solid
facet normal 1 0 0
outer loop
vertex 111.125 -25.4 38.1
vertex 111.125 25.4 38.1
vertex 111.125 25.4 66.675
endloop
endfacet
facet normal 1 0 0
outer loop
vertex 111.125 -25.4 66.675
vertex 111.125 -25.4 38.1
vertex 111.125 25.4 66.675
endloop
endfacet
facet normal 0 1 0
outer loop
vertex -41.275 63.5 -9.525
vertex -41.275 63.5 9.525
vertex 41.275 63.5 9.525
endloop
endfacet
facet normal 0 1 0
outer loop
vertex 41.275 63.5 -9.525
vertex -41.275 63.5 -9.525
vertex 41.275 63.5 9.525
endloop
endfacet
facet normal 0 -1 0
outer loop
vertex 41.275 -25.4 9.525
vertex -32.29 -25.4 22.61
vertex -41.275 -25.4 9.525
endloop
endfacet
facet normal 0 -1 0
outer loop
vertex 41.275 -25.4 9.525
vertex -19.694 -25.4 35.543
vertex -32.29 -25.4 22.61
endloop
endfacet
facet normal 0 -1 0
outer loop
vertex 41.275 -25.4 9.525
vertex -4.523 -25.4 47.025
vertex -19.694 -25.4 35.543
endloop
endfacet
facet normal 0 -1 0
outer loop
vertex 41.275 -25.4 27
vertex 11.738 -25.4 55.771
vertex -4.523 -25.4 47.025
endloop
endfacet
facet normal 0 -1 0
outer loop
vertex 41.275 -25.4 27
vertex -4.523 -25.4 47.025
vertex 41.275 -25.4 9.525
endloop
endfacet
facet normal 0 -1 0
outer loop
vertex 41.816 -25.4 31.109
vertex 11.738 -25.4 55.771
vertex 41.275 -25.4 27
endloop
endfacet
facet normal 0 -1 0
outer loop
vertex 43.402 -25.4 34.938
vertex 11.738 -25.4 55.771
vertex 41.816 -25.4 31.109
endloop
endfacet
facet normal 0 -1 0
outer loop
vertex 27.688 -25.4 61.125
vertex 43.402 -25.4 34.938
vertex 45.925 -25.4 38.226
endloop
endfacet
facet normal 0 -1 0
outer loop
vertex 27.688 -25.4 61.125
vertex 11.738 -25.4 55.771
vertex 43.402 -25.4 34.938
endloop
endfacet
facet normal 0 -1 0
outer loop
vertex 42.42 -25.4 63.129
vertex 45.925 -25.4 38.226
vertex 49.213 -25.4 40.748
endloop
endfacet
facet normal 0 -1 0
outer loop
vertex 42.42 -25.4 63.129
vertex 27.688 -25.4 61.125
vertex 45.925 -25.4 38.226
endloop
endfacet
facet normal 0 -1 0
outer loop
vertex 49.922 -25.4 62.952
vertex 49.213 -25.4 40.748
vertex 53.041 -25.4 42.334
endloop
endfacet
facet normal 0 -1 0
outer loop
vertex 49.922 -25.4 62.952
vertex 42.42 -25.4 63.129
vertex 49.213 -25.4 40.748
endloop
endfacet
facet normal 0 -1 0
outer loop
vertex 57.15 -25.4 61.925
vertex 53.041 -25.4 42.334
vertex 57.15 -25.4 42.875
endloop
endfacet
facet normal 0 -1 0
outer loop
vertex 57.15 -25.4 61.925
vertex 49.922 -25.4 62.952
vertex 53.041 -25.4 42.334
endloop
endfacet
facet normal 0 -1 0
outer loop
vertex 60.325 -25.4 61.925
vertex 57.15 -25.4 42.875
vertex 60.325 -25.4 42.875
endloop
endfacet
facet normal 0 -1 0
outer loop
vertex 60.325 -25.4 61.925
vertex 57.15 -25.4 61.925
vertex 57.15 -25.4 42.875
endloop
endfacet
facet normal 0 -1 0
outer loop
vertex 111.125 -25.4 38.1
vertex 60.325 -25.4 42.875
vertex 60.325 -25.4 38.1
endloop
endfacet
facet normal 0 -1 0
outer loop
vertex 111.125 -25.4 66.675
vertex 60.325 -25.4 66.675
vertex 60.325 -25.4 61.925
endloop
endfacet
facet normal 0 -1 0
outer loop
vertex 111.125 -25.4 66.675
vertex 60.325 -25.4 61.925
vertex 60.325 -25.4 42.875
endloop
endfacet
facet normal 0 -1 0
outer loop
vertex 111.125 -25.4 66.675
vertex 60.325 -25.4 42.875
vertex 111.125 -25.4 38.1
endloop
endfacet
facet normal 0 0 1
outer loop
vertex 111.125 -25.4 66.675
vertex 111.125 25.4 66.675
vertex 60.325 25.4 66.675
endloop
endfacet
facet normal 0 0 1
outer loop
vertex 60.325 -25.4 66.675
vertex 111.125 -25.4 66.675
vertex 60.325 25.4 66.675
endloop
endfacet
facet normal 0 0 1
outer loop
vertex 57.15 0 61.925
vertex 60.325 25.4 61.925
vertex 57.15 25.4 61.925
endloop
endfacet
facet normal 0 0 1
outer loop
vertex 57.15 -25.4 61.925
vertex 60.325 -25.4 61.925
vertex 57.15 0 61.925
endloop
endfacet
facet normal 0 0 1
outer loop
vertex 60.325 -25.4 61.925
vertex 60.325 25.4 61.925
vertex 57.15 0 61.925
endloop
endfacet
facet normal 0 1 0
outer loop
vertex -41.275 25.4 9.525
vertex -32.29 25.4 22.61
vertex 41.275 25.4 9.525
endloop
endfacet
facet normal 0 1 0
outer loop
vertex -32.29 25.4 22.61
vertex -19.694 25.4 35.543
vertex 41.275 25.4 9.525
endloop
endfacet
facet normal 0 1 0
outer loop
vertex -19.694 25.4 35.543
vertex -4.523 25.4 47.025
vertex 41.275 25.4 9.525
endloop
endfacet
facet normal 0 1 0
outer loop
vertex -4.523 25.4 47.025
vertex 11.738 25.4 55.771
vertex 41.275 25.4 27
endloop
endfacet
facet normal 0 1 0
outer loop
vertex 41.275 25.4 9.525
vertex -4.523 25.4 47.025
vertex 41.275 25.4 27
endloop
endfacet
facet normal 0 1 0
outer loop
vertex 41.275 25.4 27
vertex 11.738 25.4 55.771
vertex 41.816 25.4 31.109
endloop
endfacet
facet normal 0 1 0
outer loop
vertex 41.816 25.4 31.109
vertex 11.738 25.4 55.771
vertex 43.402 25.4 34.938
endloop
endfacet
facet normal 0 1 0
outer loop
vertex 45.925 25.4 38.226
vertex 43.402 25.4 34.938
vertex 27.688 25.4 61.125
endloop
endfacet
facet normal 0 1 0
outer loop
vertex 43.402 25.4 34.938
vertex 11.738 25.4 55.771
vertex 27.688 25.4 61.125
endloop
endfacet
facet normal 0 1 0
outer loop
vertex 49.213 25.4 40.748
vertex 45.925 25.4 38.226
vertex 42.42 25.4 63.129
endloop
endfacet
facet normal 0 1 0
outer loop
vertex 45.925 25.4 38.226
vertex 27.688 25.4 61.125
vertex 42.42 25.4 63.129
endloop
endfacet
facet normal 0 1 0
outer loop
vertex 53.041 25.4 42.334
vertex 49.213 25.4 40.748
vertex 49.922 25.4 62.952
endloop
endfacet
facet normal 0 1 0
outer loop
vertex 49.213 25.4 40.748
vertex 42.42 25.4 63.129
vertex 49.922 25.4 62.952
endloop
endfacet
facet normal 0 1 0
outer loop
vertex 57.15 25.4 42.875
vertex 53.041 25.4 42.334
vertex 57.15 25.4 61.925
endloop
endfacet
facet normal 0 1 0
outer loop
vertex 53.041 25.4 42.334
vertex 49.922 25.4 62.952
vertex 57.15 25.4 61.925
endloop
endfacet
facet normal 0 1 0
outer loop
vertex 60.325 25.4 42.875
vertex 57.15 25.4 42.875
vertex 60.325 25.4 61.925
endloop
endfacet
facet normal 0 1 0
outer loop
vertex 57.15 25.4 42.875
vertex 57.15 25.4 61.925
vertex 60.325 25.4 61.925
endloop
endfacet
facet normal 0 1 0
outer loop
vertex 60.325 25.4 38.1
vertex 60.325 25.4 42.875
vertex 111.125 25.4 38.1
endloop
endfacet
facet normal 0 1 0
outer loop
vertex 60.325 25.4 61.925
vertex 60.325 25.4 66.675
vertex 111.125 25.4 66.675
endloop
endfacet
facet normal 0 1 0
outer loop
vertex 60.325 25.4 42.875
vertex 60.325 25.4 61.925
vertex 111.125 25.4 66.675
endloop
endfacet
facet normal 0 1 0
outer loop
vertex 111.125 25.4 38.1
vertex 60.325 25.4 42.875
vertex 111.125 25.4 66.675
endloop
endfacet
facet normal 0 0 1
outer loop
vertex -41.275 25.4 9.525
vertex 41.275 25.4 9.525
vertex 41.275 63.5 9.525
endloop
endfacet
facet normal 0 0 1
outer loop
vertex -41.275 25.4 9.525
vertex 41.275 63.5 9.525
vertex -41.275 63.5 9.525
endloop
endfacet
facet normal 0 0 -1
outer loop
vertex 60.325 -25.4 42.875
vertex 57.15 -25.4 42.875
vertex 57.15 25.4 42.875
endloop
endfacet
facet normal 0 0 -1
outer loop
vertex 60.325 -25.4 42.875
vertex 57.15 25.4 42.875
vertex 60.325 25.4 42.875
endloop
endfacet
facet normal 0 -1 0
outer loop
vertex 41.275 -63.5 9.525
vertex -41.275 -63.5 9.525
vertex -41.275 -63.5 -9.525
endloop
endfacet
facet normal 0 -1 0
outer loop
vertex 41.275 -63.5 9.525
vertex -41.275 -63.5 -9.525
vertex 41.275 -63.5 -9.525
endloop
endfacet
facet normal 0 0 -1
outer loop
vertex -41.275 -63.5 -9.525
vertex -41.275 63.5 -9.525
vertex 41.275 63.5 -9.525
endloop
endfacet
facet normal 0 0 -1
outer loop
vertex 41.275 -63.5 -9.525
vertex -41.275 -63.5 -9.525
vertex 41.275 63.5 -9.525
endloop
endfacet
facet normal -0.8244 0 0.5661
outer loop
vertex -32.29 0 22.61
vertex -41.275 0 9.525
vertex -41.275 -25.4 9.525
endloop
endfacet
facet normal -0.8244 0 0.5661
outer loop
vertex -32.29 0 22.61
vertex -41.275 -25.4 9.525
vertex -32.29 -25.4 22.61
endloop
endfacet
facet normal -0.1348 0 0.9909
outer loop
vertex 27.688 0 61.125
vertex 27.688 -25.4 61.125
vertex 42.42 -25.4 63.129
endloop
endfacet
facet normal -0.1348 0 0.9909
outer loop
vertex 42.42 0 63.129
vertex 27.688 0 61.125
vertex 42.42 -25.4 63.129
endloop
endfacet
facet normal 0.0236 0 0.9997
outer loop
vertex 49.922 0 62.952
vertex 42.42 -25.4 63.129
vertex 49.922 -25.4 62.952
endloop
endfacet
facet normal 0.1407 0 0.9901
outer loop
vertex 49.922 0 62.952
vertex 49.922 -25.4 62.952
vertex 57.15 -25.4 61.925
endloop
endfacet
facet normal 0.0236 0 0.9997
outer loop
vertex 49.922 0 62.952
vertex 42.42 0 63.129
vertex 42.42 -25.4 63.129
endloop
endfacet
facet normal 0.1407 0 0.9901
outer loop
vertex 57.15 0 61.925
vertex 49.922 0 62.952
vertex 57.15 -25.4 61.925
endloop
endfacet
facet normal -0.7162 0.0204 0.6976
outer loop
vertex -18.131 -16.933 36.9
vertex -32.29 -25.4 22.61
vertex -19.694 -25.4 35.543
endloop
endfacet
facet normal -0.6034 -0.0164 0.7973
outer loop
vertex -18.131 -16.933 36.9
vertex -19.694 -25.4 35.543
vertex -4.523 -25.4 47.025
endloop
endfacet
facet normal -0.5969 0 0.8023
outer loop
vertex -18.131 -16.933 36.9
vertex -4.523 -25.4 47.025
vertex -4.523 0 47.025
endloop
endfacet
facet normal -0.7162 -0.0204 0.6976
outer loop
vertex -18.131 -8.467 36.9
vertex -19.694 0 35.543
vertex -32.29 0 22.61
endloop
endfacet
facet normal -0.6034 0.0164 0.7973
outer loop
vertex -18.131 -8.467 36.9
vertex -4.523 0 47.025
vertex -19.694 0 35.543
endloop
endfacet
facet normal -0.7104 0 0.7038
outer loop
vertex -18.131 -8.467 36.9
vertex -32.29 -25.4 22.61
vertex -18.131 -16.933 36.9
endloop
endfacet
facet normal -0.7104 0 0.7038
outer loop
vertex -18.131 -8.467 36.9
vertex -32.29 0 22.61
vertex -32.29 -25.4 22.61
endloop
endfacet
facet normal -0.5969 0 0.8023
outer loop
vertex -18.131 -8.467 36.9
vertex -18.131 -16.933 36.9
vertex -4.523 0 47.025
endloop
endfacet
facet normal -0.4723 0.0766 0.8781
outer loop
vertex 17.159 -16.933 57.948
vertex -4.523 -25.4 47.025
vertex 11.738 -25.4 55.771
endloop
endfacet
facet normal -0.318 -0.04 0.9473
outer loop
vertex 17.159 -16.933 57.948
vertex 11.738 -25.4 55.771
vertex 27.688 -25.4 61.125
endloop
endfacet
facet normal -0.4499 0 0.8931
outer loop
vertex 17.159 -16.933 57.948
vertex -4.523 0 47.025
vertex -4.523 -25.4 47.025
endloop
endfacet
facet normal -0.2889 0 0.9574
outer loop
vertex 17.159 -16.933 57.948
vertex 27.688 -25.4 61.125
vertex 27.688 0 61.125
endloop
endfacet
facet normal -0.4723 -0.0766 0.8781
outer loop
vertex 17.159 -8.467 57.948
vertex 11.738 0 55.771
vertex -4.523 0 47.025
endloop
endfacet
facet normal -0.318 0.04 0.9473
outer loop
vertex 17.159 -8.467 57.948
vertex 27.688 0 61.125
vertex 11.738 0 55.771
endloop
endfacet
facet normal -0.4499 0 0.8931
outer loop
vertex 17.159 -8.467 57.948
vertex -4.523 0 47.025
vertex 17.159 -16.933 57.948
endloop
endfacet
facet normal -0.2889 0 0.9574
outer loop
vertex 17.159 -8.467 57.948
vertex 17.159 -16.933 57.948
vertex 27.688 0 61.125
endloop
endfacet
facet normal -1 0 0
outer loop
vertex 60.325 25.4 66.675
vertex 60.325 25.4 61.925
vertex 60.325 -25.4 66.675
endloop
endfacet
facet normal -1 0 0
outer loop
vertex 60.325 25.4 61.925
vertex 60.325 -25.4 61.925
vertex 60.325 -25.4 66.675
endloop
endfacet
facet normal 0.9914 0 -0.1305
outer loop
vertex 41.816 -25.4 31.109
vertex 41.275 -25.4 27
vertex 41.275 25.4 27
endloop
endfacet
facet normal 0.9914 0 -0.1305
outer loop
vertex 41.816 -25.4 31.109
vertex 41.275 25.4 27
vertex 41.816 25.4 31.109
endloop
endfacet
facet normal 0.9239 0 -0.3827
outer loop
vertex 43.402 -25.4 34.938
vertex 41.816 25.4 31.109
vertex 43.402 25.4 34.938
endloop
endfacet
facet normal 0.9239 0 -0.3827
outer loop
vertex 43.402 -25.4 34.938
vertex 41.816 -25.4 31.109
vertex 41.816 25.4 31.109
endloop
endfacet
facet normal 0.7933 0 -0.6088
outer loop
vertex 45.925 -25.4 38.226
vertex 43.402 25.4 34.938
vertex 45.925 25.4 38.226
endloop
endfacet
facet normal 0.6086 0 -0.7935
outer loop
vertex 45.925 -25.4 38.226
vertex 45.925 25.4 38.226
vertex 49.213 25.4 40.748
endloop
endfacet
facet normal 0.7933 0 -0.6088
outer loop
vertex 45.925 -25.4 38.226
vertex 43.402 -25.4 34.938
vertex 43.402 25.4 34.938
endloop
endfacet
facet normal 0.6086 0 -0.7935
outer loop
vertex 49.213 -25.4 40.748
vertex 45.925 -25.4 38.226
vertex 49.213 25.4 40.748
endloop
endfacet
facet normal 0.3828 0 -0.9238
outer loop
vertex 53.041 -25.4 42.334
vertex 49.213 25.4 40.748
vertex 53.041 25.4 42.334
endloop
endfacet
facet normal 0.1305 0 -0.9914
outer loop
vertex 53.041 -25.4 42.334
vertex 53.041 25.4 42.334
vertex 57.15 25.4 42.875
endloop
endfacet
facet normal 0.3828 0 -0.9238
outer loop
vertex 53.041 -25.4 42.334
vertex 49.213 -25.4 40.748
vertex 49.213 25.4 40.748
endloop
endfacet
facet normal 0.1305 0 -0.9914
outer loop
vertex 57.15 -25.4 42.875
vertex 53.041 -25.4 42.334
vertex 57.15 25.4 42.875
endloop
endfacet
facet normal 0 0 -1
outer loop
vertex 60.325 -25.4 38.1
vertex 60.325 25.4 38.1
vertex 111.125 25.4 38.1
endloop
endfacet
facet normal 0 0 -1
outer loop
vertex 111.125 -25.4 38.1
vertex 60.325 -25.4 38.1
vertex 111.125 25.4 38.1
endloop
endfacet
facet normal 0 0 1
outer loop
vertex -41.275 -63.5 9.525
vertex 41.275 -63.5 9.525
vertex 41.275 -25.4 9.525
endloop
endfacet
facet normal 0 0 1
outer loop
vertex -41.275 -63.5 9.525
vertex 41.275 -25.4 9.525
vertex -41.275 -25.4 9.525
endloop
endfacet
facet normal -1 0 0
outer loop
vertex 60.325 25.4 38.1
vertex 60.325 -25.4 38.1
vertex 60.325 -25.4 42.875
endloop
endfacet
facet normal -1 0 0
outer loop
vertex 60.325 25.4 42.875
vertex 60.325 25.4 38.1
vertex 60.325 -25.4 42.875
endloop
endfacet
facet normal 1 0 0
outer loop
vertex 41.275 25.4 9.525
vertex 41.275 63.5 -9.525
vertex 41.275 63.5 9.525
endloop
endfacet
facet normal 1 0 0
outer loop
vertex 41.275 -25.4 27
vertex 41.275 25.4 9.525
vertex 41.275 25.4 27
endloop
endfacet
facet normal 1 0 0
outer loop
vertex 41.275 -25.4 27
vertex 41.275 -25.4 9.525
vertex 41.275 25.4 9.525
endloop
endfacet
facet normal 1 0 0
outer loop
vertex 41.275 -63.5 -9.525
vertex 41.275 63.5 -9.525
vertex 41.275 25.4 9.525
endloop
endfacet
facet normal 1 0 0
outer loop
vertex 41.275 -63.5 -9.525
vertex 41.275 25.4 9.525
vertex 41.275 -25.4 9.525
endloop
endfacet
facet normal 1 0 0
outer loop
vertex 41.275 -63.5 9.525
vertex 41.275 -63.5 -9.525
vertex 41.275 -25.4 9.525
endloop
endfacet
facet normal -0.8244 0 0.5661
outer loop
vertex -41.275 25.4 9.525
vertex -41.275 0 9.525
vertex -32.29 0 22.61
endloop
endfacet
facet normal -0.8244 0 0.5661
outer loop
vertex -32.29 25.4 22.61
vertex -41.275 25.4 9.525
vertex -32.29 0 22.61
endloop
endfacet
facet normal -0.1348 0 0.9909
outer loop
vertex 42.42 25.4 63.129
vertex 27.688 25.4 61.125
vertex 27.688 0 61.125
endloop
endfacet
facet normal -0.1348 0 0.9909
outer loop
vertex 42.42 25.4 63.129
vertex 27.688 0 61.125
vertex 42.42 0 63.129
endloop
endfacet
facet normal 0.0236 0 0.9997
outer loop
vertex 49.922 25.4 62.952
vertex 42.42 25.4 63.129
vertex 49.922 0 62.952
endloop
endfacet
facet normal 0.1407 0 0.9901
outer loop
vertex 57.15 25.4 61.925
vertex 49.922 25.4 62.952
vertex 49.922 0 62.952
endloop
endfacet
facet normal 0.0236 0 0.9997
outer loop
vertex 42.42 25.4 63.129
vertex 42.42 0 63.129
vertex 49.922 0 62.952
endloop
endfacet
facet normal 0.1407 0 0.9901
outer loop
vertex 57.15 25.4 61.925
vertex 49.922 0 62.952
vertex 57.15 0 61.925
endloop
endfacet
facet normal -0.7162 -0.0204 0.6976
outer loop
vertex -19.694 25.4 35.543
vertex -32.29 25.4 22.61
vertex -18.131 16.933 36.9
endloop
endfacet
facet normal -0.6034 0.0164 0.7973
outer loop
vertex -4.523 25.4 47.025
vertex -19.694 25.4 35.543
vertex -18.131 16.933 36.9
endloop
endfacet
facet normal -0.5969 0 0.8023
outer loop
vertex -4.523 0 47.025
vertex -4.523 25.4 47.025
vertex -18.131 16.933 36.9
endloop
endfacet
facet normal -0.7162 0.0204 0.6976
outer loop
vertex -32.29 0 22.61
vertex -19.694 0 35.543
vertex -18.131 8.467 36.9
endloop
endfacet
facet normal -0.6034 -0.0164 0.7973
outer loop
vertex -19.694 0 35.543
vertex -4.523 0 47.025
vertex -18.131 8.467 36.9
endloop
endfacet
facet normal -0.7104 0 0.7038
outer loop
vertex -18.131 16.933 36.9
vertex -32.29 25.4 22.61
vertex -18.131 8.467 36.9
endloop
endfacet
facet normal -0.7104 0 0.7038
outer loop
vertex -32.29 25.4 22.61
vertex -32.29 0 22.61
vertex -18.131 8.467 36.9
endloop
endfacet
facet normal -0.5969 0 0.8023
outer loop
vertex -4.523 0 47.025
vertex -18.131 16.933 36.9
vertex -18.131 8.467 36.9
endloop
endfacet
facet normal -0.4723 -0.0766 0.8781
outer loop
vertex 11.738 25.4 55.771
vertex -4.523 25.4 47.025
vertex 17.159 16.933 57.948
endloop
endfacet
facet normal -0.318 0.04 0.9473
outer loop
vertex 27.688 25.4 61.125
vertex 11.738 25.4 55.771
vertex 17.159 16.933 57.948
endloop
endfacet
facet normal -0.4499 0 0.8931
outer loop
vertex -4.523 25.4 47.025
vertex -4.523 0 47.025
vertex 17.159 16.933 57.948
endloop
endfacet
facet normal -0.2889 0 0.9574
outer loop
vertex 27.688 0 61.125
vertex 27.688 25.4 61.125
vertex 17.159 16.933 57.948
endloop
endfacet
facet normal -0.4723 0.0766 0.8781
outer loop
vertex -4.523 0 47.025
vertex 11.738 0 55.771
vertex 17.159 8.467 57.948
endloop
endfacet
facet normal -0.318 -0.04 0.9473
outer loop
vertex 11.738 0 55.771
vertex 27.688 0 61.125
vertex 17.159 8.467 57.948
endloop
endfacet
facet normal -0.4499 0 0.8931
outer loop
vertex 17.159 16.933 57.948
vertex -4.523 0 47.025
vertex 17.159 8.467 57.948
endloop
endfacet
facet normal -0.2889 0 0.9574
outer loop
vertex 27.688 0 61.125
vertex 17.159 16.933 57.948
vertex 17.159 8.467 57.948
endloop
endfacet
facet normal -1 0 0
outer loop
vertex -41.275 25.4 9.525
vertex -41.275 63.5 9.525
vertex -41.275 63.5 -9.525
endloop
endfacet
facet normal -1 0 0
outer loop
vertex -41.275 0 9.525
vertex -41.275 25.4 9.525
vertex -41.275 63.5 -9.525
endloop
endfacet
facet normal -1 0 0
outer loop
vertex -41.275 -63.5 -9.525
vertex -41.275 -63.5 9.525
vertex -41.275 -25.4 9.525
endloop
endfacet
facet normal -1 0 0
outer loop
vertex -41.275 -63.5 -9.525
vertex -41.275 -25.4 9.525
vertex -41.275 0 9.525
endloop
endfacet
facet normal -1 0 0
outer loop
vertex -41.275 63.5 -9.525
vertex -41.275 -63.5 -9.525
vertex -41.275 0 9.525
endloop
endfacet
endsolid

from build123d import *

# Parameters (mm, degrees)
F1_DEPTH = 63.5
F0_W     = 25.4
F0_H     = 19.05
F0_H_2   = 4.7498
F0_H_3   = 4.7752
F2_DEPTH = 25.4


with BuildPart() as f1:
    # F0 (on Front) → F1 (new body, symmetric)
    with BuildSketch(Plane.XZ):
        Polygon((-41.275, 9.525), (-41.275, -9.525), (41.275, -9.525), (41.275, 9.525), (22.225, 9.525), align=None)
    extrude(amount=F1_DEPTH, both=True)

    # F0 (on Front) → F2 (join, symmetric)
    with BuildSketch(Plane.XZ):
        Polygon((-41.275, 9.525), (-41.275, -9.525), (41.275, -9.525), (41.275, 9.525), (22.225, 9.525), align=None)
        with BuildLine():
            add(Edge.make_bspline(
                [(-41.275, 9.525), (-26.6867671162, 36.4819094539), (17.2914229333, 70.0652599335), (57.15, 61.9252)],
                knots=[0, 0, 0, 0, 111.5045361635, 111.5045361635, 111.5045361635, 111.5045361635], degree=3))
            Line((-41.275, 9.525), (22.225, 9.525))
            Line((22.225, 9.525), (22.225, 27.0002))
            ThreePointArc((22.225, 27.0002), (32.4542956671, 51.6959043329), (57.15, 61.9252))
        make_face()
        with BuildLine():
            Line((22.225, 9.525), (41.275, 9.525))
            Line((41.275, 9.525), (41.275, 27.0002))
            ThreePointArc((41.275, 27.0002), (45.9246798487, 38.2255201513), (57.15, 42.8752))
            Line((57.15, 42.8752), (60.325, 42.8752))
            Line((60.325, 42.8752), (60.325, 61.9252))
            Line((60.325, 61.9252), (57.15, 61.9252))
            ThreePointArc((57.15, 61.9252), (32.4542956671, 51.6959043329), (22.225, 27.0002))
            Line((22.225, 27.0002), (22.225, 9.525))
        make_face()
        with Locations((73.025, 52.4002)):
            Rectangle(F0_W, F0_H)
        with Locations((73.025, 64.3001)):
            Rectangle(F0_W, F0_H_2)
        with Locations((73.025, 40.4876)):
            Rectangle(F0_W, F0_H_3)
        Polygon((85.725, 66.675), (85.725, 61.9252), (85.725, 42.8752), (85.725, 38.1), (111.125, 38.1), (111.125, 66.675), align=None)
    extrude(amount=F2_DEPTH, both=True)


solid = f1.part
